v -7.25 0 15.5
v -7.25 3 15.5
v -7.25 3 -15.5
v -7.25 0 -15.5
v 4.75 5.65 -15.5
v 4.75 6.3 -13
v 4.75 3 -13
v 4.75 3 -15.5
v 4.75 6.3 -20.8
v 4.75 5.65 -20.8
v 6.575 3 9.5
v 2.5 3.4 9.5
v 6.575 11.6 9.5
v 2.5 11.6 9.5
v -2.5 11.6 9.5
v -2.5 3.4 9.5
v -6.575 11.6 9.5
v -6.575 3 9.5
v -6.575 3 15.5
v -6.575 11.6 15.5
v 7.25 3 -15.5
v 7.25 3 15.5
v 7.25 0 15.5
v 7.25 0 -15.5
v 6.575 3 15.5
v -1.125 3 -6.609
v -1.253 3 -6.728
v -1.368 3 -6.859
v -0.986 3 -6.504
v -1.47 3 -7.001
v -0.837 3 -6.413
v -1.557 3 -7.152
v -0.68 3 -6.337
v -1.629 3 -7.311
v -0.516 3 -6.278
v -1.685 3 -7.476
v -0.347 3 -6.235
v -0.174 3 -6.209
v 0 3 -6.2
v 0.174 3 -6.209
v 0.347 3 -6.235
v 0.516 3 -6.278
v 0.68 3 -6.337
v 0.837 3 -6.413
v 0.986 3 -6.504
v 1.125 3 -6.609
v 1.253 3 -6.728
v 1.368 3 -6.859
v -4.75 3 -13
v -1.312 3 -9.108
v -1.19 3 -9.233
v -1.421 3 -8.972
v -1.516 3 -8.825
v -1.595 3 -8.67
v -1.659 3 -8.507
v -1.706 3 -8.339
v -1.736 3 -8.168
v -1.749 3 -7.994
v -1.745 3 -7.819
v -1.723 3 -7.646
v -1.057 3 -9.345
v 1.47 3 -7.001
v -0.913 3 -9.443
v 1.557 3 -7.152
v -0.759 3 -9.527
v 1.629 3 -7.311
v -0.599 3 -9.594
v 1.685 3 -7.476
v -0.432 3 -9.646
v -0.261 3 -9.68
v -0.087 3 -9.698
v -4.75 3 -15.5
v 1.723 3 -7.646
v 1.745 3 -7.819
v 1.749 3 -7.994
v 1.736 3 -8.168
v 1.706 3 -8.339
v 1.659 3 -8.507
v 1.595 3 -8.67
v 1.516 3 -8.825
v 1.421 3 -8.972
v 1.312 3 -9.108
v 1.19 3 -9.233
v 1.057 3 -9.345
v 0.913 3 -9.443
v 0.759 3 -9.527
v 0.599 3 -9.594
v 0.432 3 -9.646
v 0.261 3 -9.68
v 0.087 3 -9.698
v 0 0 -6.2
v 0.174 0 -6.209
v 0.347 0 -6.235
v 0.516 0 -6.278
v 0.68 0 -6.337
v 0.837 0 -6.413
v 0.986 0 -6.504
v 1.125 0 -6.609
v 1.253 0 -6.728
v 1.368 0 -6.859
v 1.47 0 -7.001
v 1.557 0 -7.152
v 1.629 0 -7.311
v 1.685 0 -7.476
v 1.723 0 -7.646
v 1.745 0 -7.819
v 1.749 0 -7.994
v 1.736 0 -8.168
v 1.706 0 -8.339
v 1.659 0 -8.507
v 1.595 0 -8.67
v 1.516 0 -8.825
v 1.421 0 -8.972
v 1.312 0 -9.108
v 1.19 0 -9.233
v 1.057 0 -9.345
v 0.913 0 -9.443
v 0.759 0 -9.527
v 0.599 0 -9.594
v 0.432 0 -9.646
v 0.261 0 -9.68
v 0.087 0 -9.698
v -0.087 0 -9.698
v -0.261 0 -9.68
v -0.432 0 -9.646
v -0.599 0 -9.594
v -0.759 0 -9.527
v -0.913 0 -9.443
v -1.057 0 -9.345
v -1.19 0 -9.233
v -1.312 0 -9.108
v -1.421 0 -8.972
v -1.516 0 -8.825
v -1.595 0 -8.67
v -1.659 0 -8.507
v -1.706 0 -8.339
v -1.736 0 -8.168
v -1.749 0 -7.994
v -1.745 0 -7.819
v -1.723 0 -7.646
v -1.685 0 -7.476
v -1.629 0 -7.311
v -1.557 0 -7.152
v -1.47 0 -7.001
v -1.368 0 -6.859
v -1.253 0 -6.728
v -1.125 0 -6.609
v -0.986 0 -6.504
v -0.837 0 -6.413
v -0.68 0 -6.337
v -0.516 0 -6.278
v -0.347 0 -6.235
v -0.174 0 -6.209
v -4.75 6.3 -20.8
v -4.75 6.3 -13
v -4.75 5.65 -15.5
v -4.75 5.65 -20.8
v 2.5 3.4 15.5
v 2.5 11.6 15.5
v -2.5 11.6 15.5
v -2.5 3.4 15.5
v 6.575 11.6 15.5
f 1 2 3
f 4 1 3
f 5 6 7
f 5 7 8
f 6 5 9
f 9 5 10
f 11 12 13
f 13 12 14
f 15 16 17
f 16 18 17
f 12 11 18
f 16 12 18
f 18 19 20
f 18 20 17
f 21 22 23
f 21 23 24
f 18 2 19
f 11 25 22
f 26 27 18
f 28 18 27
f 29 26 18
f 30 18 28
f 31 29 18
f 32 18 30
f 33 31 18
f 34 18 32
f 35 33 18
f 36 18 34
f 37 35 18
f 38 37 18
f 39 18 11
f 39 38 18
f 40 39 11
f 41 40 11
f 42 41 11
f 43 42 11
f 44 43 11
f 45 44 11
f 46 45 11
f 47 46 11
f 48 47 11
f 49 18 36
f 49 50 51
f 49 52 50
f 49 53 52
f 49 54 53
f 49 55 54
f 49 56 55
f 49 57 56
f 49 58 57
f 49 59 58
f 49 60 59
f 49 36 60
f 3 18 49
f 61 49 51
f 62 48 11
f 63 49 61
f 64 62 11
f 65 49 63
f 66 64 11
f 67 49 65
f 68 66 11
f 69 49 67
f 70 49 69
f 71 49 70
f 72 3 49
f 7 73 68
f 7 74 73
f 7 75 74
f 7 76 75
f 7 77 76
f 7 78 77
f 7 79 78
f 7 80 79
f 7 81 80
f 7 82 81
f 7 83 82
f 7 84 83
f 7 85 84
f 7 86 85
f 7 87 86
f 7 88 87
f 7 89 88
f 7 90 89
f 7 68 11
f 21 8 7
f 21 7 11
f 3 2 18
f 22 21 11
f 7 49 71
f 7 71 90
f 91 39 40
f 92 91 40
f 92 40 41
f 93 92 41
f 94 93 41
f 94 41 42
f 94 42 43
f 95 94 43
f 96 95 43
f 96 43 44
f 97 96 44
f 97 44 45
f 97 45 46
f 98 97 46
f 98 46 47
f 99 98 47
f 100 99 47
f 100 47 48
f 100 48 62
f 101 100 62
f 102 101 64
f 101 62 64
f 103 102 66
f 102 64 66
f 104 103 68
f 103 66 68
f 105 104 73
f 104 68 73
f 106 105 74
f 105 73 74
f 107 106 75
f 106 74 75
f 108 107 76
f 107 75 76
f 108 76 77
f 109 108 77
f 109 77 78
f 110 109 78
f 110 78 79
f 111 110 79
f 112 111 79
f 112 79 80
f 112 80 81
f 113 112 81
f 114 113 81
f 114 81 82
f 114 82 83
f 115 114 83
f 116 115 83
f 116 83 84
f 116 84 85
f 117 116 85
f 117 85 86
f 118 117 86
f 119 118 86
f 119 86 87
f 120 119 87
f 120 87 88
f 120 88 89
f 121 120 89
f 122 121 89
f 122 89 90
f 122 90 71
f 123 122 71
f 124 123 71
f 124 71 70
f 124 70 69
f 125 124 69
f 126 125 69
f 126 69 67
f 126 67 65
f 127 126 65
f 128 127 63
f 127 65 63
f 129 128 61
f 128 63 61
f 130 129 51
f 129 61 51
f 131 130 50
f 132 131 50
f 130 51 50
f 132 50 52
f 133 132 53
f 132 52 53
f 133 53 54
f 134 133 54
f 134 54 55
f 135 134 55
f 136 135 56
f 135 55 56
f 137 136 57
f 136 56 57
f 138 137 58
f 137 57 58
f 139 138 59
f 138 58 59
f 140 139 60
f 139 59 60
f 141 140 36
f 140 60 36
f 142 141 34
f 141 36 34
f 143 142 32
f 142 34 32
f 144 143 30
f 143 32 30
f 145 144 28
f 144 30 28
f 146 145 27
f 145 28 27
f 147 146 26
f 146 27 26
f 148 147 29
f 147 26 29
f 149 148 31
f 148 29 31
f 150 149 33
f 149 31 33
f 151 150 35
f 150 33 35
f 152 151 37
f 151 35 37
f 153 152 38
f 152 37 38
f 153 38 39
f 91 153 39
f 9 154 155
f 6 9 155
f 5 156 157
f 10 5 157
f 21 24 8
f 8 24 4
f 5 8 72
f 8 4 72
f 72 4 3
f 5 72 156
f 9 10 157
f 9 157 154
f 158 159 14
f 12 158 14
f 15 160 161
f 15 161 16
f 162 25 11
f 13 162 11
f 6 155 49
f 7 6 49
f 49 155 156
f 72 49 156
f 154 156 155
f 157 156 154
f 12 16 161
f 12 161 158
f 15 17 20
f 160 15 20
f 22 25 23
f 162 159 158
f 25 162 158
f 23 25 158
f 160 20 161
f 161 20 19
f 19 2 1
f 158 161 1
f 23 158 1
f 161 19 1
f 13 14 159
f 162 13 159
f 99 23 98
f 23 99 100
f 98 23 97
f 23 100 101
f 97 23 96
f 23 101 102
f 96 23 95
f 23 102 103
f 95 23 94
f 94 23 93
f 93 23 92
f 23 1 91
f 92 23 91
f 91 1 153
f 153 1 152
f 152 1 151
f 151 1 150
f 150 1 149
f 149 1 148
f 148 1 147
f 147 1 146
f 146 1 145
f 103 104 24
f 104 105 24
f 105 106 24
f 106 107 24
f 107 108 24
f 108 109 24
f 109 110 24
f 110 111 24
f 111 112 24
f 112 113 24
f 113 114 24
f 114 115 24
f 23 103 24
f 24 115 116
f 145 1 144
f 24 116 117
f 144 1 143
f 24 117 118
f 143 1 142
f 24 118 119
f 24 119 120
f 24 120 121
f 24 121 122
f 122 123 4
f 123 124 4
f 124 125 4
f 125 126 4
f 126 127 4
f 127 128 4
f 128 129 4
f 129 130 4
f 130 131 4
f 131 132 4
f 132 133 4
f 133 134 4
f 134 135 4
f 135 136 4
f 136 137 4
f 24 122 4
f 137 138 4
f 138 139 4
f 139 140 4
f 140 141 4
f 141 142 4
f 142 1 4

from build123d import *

# Parameters (mm, degrees)
BOSS_EXTRUDE1_DEPTH      = 7.25
BOSS_EXTRUDE1_DEPTH_BACK = 7.25
SKETCH2_W                = 2.5
SKETCH2_H                = 7.8
SKETCH2_W_2              = 0.675
SKETCH2_H_2              = 6
CUT_EXTRUDE1_DEPTH       = 24.646617094
SKETCH3_W                = 5
SKETCH3_H                = 6
CUT_EXTRUDE2_DEPTH       = 8.2
SKETCH4_R                = 1.75
CUT_EXTRUDE3_DEPTH       = 24.646617094


with BuildPart() as part:
    # Sketch1 → Boss-Extrude1 (new, two sides: drawn at the far end of the back side and taken through both)
    with BuildSketch(Plane(origin=(0, 0, 0), x_dir=(0, 0, -1), z_dir=(1, 0, 0)).offset(-BOSS_EXTRUDE1_DEPTH_BACK)):
        Polygon((-15.5, 0), (15.5, 0), (15.5, 5.65), (20.8, 5.65), (20.8, 6.3), (13, 6.3), (13, 3), (-9.5, 3), (-9.5, 11.6), (-15.5, 11.6), align=None)
    extrude(amount=BOSS_EXTRUDE1_DEPTH + BOSS_EXTRUDE1_DEPTH_BACK)

    # Sketch2 → Cut-Extrude1 (cut, through all)
    with BuildSketch(Plane(origin=(0, 3, 0), x_dir=(1, 0, 0), z_dir=(0, 1, 0))):
        with Locations((-6, 16.9)):
            Rectangle(SKETCH2_W, SKETCH2_H)
        with Locations((6, 16.9)):
            Rectangle(SKETCH2_W, SKETCH2_H)
        with Locations((-6.9125, -12.5)):
            Rectangle(SKETCH2_W_2, SKETCH2_H_2)
        with Locations((6.9125, -12.5)):
            Rectangle(SKETCH2_W_2, SKETCH2_H_2)
    extrude(amount=CUT_EXTRUDE1_DEPTH, mode=Mode.SUBTRACT)

    # Sketch3 → Cut-Extrude2 (cut)
    with BuildSketch(Plane(origin=(0, 11.6, 0), x_dir=(1, 0, 0), z_dir=(0, 1, 0))):
        with Locations((0, -12.5)):
            Rectangle(SKETCH3_W, SKETCH3_H)
    extrude(amount=-CUT_EXTRUDE2_DEPTH, mode=Mode.SUBTRACT)

    # Sketch4 → Cut-Extrude3 (cut, through all)
    with BuildSketch(Plane(origin=(0, 3, 0), x_dir=(1, 0, 0), z_dir=(0, 1, 0))):
        with Locations((0, 7.95)):
            Circle(SKETCH4_R)
    extrude(amount=-CUT_EXTRUDE3_DEPTH, mode=Mode.SUBTRACT)


solid = part.part
